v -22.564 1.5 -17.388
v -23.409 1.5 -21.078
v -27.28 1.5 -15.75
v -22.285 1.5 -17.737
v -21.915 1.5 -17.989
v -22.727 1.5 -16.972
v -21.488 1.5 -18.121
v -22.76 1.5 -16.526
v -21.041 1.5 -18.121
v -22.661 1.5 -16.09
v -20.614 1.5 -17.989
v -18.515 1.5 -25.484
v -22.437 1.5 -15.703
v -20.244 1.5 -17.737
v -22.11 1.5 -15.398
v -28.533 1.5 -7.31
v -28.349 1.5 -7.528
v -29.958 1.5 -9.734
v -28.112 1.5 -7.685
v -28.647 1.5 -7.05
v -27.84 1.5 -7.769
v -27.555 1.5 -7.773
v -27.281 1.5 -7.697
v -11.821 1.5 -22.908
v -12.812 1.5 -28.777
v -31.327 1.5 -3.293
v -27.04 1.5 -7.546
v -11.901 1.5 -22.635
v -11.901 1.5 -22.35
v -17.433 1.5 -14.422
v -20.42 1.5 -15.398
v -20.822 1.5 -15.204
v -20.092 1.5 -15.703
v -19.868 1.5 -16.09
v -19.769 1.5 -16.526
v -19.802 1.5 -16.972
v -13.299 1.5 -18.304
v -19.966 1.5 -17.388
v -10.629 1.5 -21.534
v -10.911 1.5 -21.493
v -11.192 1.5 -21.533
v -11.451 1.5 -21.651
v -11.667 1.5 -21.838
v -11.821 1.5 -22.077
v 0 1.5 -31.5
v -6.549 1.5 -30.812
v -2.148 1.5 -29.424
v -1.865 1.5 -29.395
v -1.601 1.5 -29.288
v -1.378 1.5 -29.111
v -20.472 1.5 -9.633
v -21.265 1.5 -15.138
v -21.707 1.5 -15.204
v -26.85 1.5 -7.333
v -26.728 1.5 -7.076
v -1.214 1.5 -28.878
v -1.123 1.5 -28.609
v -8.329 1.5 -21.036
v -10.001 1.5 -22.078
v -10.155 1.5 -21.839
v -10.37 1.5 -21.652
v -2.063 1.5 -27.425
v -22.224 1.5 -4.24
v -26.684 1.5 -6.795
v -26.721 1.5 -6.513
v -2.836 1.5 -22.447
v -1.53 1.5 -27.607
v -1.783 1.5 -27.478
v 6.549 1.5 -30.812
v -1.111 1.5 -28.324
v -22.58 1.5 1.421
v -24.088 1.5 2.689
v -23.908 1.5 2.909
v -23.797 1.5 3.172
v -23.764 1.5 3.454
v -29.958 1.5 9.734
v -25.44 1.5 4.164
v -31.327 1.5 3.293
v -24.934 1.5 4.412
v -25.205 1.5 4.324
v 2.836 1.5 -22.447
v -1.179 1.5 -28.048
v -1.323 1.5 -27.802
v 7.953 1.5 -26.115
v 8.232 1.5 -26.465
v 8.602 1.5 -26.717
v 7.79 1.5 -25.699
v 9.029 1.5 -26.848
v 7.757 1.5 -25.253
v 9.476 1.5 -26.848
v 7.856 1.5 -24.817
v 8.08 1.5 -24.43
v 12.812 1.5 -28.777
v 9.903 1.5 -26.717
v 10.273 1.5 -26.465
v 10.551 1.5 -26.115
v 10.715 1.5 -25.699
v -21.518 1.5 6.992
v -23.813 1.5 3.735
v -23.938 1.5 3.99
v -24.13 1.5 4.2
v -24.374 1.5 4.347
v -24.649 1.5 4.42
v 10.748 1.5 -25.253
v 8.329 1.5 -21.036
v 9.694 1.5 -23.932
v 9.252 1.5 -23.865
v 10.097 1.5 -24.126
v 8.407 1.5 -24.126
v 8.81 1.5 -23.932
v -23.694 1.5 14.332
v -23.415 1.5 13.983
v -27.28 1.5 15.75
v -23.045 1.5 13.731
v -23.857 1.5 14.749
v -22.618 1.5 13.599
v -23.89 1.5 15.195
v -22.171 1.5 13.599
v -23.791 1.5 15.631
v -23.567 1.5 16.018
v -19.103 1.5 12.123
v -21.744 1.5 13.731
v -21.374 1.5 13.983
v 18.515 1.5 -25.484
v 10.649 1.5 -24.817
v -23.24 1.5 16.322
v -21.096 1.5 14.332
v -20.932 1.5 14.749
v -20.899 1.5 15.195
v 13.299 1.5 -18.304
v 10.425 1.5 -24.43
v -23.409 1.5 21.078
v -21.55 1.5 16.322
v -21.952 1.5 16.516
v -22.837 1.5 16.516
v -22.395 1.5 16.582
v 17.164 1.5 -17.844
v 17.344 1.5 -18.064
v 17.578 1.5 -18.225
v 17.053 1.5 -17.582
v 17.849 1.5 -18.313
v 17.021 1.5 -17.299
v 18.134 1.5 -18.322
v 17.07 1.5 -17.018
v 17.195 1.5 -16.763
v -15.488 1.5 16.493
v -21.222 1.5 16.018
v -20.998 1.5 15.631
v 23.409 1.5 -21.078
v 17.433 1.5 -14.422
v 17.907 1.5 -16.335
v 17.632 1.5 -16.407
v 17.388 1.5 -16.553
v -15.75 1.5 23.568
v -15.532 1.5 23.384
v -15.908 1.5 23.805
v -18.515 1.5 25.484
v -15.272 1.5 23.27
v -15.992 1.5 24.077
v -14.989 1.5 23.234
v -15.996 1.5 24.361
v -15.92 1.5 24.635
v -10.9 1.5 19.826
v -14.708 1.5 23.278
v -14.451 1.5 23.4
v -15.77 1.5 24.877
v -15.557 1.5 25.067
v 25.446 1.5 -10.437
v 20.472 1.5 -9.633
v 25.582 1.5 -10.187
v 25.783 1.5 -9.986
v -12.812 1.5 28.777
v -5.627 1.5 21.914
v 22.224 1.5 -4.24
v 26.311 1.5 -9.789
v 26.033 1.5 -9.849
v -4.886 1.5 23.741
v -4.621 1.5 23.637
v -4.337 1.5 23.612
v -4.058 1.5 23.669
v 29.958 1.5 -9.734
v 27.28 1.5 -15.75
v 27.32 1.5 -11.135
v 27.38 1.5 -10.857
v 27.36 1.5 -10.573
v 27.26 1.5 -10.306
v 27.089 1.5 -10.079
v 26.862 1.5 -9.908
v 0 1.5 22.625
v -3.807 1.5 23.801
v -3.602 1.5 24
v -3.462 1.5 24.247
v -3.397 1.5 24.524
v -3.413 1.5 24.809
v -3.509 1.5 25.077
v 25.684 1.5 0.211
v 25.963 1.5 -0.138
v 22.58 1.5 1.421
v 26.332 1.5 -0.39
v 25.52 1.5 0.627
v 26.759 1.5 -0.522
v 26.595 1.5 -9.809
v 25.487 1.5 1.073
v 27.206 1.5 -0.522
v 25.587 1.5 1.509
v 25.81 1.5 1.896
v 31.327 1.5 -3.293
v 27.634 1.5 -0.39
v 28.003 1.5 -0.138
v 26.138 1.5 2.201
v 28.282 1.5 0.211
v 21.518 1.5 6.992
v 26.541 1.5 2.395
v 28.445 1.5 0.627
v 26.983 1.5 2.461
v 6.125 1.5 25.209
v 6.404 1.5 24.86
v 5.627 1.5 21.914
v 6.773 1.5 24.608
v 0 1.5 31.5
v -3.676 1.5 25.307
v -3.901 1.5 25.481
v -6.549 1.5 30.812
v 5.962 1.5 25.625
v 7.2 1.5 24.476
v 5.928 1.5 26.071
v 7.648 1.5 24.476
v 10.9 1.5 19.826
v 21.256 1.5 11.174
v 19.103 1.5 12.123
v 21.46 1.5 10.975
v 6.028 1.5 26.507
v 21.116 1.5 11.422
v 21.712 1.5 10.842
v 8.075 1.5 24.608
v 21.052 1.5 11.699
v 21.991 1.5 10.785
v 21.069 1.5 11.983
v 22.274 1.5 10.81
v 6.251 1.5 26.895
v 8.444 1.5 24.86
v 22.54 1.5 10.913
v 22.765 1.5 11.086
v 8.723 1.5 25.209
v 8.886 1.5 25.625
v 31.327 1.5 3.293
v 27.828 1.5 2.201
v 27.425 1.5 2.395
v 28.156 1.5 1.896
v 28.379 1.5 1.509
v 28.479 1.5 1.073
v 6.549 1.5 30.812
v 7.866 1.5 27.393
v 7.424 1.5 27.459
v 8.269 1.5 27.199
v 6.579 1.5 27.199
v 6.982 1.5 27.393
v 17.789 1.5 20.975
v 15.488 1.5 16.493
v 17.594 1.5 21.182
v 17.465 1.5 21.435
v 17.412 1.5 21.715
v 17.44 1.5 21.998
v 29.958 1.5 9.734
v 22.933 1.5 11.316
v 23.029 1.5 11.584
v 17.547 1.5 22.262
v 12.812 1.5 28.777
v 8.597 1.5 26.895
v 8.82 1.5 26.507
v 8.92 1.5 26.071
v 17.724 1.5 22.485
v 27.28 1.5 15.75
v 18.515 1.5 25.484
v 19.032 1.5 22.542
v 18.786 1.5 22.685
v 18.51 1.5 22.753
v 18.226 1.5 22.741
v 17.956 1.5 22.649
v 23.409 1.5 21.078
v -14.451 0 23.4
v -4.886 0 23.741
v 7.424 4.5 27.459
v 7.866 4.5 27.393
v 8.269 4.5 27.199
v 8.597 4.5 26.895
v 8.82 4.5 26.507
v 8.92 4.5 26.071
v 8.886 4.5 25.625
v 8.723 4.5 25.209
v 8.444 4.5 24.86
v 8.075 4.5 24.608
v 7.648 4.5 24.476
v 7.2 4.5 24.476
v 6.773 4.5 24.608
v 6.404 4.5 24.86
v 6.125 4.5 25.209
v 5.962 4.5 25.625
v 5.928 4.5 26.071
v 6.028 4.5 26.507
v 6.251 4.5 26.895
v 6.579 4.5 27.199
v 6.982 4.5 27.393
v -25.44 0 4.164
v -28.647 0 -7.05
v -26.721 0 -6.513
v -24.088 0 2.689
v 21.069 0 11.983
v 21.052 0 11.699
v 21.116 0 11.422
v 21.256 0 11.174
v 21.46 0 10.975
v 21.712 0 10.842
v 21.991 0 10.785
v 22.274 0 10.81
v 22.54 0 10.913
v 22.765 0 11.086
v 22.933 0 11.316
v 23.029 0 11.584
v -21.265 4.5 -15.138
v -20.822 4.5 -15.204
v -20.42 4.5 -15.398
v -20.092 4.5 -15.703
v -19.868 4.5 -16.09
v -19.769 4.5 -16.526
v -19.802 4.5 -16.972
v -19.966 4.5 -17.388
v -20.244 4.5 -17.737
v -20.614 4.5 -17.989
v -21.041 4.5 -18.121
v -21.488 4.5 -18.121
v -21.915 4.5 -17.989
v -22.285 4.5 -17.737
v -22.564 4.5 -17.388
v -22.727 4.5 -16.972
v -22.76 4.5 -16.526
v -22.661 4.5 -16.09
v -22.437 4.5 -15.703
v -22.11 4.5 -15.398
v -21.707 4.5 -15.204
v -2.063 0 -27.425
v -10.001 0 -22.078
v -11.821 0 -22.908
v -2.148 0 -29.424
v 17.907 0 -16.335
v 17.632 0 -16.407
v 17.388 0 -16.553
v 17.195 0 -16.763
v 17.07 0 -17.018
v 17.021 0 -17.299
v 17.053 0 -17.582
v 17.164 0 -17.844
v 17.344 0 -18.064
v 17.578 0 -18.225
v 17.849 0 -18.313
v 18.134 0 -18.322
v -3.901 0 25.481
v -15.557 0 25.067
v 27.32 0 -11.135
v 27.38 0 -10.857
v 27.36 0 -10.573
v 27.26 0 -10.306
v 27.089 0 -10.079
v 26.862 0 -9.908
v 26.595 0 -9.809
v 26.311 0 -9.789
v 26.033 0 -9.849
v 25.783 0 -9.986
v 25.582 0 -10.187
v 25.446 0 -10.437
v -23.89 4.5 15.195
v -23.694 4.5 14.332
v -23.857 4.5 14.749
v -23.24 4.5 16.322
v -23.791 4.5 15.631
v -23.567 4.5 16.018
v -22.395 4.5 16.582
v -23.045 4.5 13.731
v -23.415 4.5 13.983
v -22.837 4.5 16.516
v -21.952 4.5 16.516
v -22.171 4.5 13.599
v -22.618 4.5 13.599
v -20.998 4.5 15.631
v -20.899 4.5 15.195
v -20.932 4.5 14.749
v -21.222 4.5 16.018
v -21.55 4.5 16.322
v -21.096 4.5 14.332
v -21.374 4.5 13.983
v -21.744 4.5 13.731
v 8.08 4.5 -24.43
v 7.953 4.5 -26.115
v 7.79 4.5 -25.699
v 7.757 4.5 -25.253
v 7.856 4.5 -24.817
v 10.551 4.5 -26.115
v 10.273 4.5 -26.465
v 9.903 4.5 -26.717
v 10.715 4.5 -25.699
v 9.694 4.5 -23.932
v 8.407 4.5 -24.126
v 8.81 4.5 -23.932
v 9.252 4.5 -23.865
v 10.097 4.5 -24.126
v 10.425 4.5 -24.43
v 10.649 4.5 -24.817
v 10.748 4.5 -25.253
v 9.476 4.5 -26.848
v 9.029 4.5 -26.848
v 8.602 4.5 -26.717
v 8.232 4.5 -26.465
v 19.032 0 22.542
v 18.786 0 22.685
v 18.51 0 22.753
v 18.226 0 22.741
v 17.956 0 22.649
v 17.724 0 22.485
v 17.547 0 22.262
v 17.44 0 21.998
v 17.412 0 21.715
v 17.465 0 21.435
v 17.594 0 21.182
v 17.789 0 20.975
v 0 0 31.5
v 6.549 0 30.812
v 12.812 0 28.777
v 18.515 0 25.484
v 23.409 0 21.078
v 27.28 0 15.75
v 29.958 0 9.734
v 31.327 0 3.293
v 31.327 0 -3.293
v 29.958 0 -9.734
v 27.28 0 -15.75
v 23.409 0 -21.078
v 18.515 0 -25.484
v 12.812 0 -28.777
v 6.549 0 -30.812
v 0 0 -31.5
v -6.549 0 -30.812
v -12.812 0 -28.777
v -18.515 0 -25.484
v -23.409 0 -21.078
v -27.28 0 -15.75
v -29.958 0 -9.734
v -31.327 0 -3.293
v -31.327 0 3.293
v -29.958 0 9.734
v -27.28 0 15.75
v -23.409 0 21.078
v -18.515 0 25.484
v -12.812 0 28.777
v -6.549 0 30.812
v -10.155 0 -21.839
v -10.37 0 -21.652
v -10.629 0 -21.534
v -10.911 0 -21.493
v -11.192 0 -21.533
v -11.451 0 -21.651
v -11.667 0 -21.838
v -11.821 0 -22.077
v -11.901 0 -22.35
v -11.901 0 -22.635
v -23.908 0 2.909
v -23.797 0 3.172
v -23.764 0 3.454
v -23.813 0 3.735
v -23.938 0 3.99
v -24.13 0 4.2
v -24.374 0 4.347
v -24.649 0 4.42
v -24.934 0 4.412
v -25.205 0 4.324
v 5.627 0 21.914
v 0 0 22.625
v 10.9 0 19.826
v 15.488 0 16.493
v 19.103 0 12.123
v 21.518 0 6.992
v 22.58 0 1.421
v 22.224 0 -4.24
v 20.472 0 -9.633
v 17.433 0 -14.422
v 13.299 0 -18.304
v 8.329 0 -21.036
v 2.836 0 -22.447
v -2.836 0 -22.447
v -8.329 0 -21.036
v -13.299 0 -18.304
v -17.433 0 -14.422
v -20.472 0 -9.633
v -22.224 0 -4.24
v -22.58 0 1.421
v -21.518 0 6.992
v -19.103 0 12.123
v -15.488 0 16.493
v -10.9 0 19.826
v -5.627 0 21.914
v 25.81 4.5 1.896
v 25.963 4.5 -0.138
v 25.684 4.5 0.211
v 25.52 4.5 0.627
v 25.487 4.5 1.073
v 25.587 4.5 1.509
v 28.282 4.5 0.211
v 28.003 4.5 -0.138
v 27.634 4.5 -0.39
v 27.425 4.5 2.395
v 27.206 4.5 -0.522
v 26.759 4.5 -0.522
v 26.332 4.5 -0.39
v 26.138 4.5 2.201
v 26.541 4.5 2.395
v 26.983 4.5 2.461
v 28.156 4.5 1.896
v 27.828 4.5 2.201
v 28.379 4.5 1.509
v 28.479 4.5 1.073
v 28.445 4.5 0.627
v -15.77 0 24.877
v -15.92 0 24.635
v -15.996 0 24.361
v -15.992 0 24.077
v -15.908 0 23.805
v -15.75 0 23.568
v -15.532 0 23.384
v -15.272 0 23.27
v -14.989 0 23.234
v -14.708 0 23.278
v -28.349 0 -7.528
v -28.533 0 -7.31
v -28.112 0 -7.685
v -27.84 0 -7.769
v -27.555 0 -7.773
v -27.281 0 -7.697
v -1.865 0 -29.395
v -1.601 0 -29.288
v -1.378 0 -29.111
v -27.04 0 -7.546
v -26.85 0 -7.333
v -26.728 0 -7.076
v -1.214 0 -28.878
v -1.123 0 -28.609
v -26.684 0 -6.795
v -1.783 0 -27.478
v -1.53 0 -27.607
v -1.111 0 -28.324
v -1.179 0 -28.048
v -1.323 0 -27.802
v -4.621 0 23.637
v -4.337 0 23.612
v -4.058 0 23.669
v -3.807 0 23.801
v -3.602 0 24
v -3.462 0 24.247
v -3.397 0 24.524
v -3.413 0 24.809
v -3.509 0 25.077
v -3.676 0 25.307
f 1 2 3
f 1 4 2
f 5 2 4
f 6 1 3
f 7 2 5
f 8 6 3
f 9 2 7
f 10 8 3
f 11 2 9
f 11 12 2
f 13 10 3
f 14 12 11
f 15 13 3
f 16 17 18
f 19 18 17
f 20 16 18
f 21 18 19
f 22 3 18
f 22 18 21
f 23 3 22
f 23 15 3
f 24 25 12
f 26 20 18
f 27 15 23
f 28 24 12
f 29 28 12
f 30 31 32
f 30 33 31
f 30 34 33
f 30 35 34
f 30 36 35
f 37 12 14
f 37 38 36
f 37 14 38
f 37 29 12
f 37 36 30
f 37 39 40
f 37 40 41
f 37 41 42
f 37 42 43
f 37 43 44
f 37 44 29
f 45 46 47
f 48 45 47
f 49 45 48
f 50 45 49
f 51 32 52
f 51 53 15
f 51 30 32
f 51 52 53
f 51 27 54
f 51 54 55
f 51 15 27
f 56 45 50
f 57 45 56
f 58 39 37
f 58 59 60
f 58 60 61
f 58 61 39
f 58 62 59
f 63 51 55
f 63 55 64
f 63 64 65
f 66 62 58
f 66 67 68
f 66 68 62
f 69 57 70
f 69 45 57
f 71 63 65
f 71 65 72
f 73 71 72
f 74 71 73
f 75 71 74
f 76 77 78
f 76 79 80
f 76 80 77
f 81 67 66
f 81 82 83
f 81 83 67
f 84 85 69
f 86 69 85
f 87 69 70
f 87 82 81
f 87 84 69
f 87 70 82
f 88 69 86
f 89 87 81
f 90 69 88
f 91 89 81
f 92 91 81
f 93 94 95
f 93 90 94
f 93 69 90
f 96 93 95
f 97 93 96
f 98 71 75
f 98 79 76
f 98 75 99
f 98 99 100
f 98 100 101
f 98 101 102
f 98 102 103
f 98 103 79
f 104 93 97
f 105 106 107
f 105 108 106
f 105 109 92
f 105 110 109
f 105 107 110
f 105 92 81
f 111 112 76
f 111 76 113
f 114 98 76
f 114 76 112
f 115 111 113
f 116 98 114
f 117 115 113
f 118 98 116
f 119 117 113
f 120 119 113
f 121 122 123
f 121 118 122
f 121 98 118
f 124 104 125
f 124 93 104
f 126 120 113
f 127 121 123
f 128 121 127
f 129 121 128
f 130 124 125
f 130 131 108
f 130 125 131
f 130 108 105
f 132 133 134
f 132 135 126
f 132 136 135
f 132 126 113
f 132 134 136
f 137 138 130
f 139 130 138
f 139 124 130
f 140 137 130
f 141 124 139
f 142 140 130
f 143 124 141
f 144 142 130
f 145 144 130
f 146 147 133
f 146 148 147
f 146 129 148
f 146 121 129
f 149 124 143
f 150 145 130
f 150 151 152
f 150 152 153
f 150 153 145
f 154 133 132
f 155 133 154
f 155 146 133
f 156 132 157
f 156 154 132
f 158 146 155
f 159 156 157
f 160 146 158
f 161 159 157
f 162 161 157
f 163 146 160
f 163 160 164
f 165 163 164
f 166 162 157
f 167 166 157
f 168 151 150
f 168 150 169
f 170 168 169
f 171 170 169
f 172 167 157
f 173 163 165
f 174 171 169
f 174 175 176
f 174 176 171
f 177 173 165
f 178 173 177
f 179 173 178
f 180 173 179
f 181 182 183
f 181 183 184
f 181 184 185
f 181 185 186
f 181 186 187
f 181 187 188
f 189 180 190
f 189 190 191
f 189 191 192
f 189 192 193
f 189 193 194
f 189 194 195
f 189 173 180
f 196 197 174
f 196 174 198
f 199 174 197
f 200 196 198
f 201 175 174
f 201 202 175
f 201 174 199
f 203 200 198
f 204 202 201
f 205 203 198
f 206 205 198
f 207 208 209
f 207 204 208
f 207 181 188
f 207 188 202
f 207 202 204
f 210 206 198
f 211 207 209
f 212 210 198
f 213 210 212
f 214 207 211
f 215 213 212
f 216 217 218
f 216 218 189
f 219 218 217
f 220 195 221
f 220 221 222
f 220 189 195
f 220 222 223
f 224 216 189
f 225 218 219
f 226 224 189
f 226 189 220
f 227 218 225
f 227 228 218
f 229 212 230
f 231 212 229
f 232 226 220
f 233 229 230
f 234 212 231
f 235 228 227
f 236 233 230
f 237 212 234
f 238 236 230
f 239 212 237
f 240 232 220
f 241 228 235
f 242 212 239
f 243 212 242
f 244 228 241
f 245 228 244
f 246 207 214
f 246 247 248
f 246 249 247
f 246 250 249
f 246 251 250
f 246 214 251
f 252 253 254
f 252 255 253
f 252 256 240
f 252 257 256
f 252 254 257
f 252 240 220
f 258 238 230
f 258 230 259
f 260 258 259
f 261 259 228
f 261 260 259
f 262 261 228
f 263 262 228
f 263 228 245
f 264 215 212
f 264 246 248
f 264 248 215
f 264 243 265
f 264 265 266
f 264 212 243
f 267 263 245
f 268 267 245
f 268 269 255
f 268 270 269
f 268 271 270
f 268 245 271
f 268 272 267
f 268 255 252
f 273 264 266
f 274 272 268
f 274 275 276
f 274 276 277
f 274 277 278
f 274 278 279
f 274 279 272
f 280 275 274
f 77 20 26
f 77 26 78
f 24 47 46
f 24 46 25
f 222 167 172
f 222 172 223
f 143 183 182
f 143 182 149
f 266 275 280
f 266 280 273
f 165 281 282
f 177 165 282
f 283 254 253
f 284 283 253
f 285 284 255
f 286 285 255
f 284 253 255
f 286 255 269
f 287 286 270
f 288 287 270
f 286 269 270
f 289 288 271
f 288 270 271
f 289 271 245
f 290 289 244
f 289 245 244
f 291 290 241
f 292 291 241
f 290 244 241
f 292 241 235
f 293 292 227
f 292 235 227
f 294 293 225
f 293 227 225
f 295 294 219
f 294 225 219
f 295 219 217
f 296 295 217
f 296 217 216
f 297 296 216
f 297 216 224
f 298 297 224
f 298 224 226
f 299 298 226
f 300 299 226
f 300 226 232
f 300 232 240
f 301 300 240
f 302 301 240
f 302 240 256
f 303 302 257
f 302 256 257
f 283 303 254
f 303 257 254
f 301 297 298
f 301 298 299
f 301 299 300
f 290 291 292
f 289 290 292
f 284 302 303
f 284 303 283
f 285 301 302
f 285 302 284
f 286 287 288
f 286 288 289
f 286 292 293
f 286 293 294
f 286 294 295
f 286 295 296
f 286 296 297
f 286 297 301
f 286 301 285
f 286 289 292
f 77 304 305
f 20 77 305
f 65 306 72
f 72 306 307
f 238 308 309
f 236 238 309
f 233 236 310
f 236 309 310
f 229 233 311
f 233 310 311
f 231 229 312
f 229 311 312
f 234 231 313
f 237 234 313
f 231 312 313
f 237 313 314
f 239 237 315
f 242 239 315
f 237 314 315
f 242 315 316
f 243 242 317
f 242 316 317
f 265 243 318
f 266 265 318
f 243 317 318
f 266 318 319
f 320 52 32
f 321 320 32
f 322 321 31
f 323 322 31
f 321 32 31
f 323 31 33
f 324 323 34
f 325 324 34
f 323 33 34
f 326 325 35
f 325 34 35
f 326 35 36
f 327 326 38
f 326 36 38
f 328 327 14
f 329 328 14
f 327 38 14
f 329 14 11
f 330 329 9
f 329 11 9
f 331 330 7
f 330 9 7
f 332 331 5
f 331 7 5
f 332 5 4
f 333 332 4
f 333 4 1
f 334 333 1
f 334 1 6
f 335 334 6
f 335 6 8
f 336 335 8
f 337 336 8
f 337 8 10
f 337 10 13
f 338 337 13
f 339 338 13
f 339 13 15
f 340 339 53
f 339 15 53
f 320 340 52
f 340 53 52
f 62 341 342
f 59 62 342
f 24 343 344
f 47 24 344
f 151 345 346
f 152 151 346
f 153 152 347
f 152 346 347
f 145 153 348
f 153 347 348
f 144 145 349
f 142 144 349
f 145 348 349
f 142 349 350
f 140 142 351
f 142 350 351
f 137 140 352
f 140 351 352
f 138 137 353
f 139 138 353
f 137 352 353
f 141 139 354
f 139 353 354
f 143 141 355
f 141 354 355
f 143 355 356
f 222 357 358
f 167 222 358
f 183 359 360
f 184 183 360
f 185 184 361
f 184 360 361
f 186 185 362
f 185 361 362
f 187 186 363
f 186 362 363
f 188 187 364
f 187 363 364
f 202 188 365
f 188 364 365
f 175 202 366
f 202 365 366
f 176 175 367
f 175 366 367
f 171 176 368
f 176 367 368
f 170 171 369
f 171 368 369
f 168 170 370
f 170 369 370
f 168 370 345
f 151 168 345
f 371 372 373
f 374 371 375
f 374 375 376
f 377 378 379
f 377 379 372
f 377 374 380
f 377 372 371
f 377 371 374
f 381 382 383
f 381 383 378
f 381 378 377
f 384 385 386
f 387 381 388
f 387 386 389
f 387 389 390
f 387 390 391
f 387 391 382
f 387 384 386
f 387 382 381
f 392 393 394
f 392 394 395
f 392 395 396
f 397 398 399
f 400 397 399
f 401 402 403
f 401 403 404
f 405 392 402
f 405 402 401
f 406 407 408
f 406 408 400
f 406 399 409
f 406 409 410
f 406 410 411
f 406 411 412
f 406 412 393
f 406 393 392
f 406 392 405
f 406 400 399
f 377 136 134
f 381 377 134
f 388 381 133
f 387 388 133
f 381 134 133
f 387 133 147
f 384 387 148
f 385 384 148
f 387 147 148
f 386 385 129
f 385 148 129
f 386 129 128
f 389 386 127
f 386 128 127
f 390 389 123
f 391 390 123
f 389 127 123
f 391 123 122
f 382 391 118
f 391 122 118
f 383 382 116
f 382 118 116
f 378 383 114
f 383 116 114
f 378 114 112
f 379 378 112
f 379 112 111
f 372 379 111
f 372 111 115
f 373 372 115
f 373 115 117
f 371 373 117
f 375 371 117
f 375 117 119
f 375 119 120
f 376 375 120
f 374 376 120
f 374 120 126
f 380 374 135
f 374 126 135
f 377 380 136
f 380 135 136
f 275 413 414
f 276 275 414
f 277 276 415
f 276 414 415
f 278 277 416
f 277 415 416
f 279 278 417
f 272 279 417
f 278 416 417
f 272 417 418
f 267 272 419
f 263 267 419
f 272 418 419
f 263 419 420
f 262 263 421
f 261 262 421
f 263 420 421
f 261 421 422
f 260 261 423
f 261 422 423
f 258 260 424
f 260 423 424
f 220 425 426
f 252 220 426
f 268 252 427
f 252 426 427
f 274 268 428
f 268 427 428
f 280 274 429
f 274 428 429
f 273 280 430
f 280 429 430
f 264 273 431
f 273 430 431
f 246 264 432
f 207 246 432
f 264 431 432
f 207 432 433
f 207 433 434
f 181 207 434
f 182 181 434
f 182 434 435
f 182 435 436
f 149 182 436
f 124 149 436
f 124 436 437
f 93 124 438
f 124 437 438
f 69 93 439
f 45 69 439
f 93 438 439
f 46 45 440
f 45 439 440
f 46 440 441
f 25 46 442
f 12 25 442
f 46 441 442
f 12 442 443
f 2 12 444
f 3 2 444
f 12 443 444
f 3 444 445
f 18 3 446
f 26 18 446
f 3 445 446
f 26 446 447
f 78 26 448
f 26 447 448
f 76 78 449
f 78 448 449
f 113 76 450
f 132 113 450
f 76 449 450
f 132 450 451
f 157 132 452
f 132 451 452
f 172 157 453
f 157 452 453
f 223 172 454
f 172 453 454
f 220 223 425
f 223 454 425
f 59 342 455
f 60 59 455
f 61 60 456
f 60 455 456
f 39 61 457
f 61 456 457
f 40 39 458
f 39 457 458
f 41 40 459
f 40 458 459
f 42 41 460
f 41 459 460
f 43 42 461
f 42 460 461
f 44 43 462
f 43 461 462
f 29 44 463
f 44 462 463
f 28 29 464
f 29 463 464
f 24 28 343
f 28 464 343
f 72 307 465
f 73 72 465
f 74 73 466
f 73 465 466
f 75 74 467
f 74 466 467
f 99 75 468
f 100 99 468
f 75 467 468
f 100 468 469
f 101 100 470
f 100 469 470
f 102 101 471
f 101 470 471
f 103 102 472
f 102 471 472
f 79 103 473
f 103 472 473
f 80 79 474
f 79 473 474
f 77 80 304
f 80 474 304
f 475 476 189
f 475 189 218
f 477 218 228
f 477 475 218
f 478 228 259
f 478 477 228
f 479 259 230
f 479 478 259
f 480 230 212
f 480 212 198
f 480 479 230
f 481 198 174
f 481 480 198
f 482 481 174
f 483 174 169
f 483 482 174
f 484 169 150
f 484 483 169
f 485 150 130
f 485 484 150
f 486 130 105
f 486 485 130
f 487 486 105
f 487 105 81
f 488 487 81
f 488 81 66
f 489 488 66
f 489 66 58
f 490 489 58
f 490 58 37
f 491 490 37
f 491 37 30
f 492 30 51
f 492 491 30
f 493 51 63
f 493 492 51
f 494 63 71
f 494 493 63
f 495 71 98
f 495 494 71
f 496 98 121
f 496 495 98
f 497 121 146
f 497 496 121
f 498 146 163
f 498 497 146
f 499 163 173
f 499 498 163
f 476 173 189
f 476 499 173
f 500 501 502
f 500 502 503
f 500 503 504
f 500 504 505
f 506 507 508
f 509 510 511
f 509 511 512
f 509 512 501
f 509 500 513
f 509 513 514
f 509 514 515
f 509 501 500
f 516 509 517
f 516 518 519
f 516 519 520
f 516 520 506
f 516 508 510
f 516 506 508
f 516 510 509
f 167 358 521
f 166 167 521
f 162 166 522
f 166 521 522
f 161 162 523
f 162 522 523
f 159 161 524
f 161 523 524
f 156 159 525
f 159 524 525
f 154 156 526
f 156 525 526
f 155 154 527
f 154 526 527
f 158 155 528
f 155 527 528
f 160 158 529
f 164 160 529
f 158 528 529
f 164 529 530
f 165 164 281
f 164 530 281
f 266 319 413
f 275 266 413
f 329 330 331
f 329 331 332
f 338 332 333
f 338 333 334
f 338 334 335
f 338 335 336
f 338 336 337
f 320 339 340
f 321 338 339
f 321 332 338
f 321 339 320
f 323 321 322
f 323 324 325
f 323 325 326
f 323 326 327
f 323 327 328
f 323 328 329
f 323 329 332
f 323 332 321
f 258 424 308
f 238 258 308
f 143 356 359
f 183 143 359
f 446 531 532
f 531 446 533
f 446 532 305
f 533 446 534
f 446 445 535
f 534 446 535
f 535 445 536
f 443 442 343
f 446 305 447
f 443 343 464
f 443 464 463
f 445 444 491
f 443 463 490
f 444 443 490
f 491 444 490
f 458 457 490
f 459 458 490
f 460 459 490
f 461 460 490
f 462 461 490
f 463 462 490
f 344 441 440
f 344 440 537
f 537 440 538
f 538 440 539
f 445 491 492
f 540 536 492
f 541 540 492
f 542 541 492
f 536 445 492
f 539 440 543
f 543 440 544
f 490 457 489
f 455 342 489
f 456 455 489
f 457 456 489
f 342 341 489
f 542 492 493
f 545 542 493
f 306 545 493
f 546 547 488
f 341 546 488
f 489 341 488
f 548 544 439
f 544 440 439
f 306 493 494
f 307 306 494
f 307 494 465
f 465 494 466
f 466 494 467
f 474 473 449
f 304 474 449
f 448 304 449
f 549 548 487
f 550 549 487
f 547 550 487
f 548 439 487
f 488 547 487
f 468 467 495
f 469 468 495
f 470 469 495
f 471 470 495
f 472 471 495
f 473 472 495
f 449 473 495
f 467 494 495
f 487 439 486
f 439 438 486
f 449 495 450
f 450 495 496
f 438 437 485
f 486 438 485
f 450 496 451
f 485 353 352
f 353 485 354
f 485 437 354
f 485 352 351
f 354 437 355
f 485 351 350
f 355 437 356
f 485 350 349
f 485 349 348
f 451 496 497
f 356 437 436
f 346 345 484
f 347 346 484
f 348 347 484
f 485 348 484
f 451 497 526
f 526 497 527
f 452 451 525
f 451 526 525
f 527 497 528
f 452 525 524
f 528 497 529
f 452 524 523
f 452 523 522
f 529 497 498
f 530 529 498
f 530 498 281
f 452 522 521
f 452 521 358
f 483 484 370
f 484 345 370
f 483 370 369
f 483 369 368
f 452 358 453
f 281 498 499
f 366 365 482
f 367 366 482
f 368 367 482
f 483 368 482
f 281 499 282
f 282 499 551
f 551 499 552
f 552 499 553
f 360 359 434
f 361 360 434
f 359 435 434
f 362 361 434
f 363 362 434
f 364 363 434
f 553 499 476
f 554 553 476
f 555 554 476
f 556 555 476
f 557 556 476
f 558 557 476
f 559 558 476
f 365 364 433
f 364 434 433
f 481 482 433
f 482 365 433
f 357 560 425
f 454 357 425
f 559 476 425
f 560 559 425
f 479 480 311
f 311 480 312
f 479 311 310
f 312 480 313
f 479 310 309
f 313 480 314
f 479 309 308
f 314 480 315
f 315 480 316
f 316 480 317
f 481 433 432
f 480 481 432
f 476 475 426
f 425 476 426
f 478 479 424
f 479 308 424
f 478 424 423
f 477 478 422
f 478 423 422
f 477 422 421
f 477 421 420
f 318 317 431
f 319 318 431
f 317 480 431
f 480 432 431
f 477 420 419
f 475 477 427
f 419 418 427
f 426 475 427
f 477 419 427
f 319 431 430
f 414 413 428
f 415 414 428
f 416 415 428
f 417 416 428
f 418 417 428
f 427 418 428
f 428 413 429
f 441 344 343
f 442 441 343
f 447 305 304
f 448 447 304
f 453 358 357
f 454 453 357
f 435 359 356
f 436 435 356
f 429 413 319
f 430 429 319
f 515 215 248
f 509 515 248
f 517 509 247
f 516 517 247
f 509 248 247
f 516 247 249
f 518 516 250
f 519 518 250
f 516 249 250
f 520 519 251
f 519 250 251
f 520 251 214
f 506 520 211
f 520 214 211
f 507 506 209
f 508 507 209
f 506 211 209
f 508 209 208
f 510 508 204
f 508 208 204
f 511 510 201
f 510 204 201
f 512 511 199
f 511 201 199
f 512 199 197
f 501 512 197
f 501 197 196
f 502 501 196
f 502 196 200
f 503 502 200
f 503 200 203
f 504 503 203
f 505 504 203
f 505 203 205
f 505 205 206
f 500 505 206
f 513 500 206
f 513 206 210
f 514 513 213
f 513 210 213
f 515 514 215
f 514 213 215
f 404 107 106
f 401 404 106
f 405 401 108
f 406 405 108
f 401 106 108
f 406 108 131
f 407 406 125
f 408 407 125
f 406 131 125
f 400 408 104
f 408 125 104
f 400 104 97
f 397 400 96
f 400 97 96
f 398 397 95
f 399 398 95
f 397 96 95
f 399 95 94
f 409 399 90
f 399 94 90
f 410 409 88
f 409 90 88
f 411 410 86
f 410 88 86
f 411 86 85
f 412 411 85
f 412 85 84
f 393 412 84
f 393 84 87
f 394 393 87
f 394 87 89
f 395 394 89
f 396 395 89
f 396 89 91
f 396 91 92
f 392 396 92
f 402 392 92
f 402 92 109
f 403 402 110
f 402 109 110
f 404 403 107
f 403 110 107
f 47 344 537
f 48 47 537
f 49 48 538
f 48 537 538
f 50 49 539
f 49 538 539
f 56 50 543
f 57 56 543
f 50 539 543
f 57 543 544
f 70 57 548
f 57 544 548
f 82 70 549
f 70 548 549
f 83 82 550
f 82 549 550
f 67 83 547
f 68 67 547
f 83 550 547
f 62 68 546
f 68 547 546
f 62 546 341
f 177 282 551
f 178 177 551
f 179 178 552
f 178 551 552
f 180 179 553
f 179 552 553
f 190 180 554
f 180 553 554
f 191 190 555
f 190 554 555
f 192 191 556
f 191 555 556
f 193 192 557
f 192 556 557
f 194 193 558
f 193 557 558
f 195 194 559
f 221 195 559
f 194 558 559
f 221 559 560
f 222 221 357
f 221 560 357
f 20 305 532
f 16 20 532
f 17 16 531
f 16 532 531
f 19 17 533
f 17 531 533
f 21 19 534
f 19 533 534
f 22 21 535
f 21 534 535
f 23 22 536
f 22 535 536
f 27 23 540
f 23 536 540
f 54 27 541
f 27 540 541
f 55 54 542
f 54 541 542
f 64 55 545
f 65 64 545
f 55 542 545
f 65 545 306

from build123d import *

# Parameters (mm, degrees)
SKETCH1_R           = 31.5
SKETCH1_R_2         = 22.625
BOSS_EXTRUDE1_DEPTH = 1.5
SKETCH2_R           = 1.5
BOSS_EXTRUDE2_DEPTH = 3


with BuildPart() as part:
    # Sketch1 → Boss-Extrude1 (new body)
    with BuildSketch(Plane(origin=(0, 0, 0), x_dir=(1, 0, 0), z_dir=(0, 1, 0))):
        with Locations(Location((0, 0, 0), (0, 0, 270))):
            Circle(SKETCH1_R)
        with Locations(Location((0, 0, 0), (0, 0, 270))):
            Circle(SKETCH1_R_2, mode=Mode.SUBTRACT)
        with BuildLine():
            Line((25.445602695, 10.437123544), (17.907280569, 16.334544855))
            ThreePointArc((17.907280569, 16.334544855), (17.026861096, 17.44127949), (18.13359573, 18.321698963))
            Line((18.13359573, 18.321698963), (27.319881621, 11.135033644))
            ThreePointArc((27.319881621, 11.135033644), (26.731697208, 9.848939131), (25.445602695, 10.437123544))
        make_face(mode=Mode.SUBTRACT)
        with BuildLine():
            Line((-11.821381939, 22.907790728), (-2.147738601, 29.423666069))
            ThreePointArc((-2.147738601, 29.423666069), (-1.106349013, 28.466844389), (-2.063170693, 27.425454801))
            Line((-2.063170693, 27.425454801), (-10.001421306, 22.07848783))
            ThreePointArc((-10.001421306, 22.07848783), (-11.326053072, 21.583158963), (-11.821381939, 22.907790728))
        make_face(mode=Mode.SUBTRACT)
        with BuildLine():
            Line((17.789418023, -20.974957706), (21.068729344, -11.983183919))
            ThreePointArc((21.068729344, -11.983183919), (21.849231951, -10.803855431), (23.028560438, -11.584358037))
            Line((23.028560438, -11.584358037), (19.032354011, -22.541836811))
            ThreePointArc((19.032354011, -22.541836811), (17.627446465, -22.379865253), (17.789418023, -20.974957706))
        make_face(mode=Mode.SUBTRACT)
        with BuildLine():
            Line((-14.451137717, -23.400360319), (-4.886089735, -23.74055981))
            ThreePointArc((-4.886089735, -23.74055981), (-3.523293122, -24.118429356), (-3.901162667, -25.481225968))
            Line((-3.901162667, -25.481225968), (-15.557239956, -25.066654962))
            ThreePointArc((-15.557239956, -25.066654962), (-15.837336158, -23.680456521), (-14.451137717, -23.400360319))
        make_face(mode=Mode.SUBTRACT)
        with BuildLine():
            Line((-26.720712308, 6.51273968), (-24.088498872, -2.689288956))
            ThreePointArc((-24.088498872, -2.689288956), (-24.026746852, -4.102153666), (-25.439611562, -4.163905686))
            Line((-25.439611562, -4.163905686), (-28.647257075, 7.04979206))
            ThreePointArc((-28.647257075, 7.04979206), (-27.415458501, 7.744538254), (-26.720712308, 6.51273968))
        make_face(mode=Mode.SUBTRACT)
    extrude(amount=BOSS_EXTRUDE1_DEPTH)

    # Sketch2 → Boss-Extrude2 (add)
    with BuildSketch(Plane(origin=(0, 1.5, 0), x_dir=(1, 0, 0), z_dir=(0, 1, 0))):
        with Locations(Location((-21.264622422, 16.637783303, 0), (0, 0, 270))):
            Circle(SKETCH2_R)
        with Locations(Location((9.252342519, 25.365215511, 0), (0, 0, 270))):
            Circle(SKETCH2_R)
        with Locations(Location((26.982884575, -0.961217985, 0), (0, 0, 270))):
            Circle(SKETCH2_R)
        with Locations(Location((7.423997262, -25.959280896, 0), (0, 0, 270))):
            Circle(SKETCH2_R)
        with Locations(Location((-22.394601934, -15.082499932, 0), (0, 0, 270))):
            Circle(SKETCH2_R)
    extrude(amount=BOSS_EXTRUDE2_DEPTH)


solid = part.part
